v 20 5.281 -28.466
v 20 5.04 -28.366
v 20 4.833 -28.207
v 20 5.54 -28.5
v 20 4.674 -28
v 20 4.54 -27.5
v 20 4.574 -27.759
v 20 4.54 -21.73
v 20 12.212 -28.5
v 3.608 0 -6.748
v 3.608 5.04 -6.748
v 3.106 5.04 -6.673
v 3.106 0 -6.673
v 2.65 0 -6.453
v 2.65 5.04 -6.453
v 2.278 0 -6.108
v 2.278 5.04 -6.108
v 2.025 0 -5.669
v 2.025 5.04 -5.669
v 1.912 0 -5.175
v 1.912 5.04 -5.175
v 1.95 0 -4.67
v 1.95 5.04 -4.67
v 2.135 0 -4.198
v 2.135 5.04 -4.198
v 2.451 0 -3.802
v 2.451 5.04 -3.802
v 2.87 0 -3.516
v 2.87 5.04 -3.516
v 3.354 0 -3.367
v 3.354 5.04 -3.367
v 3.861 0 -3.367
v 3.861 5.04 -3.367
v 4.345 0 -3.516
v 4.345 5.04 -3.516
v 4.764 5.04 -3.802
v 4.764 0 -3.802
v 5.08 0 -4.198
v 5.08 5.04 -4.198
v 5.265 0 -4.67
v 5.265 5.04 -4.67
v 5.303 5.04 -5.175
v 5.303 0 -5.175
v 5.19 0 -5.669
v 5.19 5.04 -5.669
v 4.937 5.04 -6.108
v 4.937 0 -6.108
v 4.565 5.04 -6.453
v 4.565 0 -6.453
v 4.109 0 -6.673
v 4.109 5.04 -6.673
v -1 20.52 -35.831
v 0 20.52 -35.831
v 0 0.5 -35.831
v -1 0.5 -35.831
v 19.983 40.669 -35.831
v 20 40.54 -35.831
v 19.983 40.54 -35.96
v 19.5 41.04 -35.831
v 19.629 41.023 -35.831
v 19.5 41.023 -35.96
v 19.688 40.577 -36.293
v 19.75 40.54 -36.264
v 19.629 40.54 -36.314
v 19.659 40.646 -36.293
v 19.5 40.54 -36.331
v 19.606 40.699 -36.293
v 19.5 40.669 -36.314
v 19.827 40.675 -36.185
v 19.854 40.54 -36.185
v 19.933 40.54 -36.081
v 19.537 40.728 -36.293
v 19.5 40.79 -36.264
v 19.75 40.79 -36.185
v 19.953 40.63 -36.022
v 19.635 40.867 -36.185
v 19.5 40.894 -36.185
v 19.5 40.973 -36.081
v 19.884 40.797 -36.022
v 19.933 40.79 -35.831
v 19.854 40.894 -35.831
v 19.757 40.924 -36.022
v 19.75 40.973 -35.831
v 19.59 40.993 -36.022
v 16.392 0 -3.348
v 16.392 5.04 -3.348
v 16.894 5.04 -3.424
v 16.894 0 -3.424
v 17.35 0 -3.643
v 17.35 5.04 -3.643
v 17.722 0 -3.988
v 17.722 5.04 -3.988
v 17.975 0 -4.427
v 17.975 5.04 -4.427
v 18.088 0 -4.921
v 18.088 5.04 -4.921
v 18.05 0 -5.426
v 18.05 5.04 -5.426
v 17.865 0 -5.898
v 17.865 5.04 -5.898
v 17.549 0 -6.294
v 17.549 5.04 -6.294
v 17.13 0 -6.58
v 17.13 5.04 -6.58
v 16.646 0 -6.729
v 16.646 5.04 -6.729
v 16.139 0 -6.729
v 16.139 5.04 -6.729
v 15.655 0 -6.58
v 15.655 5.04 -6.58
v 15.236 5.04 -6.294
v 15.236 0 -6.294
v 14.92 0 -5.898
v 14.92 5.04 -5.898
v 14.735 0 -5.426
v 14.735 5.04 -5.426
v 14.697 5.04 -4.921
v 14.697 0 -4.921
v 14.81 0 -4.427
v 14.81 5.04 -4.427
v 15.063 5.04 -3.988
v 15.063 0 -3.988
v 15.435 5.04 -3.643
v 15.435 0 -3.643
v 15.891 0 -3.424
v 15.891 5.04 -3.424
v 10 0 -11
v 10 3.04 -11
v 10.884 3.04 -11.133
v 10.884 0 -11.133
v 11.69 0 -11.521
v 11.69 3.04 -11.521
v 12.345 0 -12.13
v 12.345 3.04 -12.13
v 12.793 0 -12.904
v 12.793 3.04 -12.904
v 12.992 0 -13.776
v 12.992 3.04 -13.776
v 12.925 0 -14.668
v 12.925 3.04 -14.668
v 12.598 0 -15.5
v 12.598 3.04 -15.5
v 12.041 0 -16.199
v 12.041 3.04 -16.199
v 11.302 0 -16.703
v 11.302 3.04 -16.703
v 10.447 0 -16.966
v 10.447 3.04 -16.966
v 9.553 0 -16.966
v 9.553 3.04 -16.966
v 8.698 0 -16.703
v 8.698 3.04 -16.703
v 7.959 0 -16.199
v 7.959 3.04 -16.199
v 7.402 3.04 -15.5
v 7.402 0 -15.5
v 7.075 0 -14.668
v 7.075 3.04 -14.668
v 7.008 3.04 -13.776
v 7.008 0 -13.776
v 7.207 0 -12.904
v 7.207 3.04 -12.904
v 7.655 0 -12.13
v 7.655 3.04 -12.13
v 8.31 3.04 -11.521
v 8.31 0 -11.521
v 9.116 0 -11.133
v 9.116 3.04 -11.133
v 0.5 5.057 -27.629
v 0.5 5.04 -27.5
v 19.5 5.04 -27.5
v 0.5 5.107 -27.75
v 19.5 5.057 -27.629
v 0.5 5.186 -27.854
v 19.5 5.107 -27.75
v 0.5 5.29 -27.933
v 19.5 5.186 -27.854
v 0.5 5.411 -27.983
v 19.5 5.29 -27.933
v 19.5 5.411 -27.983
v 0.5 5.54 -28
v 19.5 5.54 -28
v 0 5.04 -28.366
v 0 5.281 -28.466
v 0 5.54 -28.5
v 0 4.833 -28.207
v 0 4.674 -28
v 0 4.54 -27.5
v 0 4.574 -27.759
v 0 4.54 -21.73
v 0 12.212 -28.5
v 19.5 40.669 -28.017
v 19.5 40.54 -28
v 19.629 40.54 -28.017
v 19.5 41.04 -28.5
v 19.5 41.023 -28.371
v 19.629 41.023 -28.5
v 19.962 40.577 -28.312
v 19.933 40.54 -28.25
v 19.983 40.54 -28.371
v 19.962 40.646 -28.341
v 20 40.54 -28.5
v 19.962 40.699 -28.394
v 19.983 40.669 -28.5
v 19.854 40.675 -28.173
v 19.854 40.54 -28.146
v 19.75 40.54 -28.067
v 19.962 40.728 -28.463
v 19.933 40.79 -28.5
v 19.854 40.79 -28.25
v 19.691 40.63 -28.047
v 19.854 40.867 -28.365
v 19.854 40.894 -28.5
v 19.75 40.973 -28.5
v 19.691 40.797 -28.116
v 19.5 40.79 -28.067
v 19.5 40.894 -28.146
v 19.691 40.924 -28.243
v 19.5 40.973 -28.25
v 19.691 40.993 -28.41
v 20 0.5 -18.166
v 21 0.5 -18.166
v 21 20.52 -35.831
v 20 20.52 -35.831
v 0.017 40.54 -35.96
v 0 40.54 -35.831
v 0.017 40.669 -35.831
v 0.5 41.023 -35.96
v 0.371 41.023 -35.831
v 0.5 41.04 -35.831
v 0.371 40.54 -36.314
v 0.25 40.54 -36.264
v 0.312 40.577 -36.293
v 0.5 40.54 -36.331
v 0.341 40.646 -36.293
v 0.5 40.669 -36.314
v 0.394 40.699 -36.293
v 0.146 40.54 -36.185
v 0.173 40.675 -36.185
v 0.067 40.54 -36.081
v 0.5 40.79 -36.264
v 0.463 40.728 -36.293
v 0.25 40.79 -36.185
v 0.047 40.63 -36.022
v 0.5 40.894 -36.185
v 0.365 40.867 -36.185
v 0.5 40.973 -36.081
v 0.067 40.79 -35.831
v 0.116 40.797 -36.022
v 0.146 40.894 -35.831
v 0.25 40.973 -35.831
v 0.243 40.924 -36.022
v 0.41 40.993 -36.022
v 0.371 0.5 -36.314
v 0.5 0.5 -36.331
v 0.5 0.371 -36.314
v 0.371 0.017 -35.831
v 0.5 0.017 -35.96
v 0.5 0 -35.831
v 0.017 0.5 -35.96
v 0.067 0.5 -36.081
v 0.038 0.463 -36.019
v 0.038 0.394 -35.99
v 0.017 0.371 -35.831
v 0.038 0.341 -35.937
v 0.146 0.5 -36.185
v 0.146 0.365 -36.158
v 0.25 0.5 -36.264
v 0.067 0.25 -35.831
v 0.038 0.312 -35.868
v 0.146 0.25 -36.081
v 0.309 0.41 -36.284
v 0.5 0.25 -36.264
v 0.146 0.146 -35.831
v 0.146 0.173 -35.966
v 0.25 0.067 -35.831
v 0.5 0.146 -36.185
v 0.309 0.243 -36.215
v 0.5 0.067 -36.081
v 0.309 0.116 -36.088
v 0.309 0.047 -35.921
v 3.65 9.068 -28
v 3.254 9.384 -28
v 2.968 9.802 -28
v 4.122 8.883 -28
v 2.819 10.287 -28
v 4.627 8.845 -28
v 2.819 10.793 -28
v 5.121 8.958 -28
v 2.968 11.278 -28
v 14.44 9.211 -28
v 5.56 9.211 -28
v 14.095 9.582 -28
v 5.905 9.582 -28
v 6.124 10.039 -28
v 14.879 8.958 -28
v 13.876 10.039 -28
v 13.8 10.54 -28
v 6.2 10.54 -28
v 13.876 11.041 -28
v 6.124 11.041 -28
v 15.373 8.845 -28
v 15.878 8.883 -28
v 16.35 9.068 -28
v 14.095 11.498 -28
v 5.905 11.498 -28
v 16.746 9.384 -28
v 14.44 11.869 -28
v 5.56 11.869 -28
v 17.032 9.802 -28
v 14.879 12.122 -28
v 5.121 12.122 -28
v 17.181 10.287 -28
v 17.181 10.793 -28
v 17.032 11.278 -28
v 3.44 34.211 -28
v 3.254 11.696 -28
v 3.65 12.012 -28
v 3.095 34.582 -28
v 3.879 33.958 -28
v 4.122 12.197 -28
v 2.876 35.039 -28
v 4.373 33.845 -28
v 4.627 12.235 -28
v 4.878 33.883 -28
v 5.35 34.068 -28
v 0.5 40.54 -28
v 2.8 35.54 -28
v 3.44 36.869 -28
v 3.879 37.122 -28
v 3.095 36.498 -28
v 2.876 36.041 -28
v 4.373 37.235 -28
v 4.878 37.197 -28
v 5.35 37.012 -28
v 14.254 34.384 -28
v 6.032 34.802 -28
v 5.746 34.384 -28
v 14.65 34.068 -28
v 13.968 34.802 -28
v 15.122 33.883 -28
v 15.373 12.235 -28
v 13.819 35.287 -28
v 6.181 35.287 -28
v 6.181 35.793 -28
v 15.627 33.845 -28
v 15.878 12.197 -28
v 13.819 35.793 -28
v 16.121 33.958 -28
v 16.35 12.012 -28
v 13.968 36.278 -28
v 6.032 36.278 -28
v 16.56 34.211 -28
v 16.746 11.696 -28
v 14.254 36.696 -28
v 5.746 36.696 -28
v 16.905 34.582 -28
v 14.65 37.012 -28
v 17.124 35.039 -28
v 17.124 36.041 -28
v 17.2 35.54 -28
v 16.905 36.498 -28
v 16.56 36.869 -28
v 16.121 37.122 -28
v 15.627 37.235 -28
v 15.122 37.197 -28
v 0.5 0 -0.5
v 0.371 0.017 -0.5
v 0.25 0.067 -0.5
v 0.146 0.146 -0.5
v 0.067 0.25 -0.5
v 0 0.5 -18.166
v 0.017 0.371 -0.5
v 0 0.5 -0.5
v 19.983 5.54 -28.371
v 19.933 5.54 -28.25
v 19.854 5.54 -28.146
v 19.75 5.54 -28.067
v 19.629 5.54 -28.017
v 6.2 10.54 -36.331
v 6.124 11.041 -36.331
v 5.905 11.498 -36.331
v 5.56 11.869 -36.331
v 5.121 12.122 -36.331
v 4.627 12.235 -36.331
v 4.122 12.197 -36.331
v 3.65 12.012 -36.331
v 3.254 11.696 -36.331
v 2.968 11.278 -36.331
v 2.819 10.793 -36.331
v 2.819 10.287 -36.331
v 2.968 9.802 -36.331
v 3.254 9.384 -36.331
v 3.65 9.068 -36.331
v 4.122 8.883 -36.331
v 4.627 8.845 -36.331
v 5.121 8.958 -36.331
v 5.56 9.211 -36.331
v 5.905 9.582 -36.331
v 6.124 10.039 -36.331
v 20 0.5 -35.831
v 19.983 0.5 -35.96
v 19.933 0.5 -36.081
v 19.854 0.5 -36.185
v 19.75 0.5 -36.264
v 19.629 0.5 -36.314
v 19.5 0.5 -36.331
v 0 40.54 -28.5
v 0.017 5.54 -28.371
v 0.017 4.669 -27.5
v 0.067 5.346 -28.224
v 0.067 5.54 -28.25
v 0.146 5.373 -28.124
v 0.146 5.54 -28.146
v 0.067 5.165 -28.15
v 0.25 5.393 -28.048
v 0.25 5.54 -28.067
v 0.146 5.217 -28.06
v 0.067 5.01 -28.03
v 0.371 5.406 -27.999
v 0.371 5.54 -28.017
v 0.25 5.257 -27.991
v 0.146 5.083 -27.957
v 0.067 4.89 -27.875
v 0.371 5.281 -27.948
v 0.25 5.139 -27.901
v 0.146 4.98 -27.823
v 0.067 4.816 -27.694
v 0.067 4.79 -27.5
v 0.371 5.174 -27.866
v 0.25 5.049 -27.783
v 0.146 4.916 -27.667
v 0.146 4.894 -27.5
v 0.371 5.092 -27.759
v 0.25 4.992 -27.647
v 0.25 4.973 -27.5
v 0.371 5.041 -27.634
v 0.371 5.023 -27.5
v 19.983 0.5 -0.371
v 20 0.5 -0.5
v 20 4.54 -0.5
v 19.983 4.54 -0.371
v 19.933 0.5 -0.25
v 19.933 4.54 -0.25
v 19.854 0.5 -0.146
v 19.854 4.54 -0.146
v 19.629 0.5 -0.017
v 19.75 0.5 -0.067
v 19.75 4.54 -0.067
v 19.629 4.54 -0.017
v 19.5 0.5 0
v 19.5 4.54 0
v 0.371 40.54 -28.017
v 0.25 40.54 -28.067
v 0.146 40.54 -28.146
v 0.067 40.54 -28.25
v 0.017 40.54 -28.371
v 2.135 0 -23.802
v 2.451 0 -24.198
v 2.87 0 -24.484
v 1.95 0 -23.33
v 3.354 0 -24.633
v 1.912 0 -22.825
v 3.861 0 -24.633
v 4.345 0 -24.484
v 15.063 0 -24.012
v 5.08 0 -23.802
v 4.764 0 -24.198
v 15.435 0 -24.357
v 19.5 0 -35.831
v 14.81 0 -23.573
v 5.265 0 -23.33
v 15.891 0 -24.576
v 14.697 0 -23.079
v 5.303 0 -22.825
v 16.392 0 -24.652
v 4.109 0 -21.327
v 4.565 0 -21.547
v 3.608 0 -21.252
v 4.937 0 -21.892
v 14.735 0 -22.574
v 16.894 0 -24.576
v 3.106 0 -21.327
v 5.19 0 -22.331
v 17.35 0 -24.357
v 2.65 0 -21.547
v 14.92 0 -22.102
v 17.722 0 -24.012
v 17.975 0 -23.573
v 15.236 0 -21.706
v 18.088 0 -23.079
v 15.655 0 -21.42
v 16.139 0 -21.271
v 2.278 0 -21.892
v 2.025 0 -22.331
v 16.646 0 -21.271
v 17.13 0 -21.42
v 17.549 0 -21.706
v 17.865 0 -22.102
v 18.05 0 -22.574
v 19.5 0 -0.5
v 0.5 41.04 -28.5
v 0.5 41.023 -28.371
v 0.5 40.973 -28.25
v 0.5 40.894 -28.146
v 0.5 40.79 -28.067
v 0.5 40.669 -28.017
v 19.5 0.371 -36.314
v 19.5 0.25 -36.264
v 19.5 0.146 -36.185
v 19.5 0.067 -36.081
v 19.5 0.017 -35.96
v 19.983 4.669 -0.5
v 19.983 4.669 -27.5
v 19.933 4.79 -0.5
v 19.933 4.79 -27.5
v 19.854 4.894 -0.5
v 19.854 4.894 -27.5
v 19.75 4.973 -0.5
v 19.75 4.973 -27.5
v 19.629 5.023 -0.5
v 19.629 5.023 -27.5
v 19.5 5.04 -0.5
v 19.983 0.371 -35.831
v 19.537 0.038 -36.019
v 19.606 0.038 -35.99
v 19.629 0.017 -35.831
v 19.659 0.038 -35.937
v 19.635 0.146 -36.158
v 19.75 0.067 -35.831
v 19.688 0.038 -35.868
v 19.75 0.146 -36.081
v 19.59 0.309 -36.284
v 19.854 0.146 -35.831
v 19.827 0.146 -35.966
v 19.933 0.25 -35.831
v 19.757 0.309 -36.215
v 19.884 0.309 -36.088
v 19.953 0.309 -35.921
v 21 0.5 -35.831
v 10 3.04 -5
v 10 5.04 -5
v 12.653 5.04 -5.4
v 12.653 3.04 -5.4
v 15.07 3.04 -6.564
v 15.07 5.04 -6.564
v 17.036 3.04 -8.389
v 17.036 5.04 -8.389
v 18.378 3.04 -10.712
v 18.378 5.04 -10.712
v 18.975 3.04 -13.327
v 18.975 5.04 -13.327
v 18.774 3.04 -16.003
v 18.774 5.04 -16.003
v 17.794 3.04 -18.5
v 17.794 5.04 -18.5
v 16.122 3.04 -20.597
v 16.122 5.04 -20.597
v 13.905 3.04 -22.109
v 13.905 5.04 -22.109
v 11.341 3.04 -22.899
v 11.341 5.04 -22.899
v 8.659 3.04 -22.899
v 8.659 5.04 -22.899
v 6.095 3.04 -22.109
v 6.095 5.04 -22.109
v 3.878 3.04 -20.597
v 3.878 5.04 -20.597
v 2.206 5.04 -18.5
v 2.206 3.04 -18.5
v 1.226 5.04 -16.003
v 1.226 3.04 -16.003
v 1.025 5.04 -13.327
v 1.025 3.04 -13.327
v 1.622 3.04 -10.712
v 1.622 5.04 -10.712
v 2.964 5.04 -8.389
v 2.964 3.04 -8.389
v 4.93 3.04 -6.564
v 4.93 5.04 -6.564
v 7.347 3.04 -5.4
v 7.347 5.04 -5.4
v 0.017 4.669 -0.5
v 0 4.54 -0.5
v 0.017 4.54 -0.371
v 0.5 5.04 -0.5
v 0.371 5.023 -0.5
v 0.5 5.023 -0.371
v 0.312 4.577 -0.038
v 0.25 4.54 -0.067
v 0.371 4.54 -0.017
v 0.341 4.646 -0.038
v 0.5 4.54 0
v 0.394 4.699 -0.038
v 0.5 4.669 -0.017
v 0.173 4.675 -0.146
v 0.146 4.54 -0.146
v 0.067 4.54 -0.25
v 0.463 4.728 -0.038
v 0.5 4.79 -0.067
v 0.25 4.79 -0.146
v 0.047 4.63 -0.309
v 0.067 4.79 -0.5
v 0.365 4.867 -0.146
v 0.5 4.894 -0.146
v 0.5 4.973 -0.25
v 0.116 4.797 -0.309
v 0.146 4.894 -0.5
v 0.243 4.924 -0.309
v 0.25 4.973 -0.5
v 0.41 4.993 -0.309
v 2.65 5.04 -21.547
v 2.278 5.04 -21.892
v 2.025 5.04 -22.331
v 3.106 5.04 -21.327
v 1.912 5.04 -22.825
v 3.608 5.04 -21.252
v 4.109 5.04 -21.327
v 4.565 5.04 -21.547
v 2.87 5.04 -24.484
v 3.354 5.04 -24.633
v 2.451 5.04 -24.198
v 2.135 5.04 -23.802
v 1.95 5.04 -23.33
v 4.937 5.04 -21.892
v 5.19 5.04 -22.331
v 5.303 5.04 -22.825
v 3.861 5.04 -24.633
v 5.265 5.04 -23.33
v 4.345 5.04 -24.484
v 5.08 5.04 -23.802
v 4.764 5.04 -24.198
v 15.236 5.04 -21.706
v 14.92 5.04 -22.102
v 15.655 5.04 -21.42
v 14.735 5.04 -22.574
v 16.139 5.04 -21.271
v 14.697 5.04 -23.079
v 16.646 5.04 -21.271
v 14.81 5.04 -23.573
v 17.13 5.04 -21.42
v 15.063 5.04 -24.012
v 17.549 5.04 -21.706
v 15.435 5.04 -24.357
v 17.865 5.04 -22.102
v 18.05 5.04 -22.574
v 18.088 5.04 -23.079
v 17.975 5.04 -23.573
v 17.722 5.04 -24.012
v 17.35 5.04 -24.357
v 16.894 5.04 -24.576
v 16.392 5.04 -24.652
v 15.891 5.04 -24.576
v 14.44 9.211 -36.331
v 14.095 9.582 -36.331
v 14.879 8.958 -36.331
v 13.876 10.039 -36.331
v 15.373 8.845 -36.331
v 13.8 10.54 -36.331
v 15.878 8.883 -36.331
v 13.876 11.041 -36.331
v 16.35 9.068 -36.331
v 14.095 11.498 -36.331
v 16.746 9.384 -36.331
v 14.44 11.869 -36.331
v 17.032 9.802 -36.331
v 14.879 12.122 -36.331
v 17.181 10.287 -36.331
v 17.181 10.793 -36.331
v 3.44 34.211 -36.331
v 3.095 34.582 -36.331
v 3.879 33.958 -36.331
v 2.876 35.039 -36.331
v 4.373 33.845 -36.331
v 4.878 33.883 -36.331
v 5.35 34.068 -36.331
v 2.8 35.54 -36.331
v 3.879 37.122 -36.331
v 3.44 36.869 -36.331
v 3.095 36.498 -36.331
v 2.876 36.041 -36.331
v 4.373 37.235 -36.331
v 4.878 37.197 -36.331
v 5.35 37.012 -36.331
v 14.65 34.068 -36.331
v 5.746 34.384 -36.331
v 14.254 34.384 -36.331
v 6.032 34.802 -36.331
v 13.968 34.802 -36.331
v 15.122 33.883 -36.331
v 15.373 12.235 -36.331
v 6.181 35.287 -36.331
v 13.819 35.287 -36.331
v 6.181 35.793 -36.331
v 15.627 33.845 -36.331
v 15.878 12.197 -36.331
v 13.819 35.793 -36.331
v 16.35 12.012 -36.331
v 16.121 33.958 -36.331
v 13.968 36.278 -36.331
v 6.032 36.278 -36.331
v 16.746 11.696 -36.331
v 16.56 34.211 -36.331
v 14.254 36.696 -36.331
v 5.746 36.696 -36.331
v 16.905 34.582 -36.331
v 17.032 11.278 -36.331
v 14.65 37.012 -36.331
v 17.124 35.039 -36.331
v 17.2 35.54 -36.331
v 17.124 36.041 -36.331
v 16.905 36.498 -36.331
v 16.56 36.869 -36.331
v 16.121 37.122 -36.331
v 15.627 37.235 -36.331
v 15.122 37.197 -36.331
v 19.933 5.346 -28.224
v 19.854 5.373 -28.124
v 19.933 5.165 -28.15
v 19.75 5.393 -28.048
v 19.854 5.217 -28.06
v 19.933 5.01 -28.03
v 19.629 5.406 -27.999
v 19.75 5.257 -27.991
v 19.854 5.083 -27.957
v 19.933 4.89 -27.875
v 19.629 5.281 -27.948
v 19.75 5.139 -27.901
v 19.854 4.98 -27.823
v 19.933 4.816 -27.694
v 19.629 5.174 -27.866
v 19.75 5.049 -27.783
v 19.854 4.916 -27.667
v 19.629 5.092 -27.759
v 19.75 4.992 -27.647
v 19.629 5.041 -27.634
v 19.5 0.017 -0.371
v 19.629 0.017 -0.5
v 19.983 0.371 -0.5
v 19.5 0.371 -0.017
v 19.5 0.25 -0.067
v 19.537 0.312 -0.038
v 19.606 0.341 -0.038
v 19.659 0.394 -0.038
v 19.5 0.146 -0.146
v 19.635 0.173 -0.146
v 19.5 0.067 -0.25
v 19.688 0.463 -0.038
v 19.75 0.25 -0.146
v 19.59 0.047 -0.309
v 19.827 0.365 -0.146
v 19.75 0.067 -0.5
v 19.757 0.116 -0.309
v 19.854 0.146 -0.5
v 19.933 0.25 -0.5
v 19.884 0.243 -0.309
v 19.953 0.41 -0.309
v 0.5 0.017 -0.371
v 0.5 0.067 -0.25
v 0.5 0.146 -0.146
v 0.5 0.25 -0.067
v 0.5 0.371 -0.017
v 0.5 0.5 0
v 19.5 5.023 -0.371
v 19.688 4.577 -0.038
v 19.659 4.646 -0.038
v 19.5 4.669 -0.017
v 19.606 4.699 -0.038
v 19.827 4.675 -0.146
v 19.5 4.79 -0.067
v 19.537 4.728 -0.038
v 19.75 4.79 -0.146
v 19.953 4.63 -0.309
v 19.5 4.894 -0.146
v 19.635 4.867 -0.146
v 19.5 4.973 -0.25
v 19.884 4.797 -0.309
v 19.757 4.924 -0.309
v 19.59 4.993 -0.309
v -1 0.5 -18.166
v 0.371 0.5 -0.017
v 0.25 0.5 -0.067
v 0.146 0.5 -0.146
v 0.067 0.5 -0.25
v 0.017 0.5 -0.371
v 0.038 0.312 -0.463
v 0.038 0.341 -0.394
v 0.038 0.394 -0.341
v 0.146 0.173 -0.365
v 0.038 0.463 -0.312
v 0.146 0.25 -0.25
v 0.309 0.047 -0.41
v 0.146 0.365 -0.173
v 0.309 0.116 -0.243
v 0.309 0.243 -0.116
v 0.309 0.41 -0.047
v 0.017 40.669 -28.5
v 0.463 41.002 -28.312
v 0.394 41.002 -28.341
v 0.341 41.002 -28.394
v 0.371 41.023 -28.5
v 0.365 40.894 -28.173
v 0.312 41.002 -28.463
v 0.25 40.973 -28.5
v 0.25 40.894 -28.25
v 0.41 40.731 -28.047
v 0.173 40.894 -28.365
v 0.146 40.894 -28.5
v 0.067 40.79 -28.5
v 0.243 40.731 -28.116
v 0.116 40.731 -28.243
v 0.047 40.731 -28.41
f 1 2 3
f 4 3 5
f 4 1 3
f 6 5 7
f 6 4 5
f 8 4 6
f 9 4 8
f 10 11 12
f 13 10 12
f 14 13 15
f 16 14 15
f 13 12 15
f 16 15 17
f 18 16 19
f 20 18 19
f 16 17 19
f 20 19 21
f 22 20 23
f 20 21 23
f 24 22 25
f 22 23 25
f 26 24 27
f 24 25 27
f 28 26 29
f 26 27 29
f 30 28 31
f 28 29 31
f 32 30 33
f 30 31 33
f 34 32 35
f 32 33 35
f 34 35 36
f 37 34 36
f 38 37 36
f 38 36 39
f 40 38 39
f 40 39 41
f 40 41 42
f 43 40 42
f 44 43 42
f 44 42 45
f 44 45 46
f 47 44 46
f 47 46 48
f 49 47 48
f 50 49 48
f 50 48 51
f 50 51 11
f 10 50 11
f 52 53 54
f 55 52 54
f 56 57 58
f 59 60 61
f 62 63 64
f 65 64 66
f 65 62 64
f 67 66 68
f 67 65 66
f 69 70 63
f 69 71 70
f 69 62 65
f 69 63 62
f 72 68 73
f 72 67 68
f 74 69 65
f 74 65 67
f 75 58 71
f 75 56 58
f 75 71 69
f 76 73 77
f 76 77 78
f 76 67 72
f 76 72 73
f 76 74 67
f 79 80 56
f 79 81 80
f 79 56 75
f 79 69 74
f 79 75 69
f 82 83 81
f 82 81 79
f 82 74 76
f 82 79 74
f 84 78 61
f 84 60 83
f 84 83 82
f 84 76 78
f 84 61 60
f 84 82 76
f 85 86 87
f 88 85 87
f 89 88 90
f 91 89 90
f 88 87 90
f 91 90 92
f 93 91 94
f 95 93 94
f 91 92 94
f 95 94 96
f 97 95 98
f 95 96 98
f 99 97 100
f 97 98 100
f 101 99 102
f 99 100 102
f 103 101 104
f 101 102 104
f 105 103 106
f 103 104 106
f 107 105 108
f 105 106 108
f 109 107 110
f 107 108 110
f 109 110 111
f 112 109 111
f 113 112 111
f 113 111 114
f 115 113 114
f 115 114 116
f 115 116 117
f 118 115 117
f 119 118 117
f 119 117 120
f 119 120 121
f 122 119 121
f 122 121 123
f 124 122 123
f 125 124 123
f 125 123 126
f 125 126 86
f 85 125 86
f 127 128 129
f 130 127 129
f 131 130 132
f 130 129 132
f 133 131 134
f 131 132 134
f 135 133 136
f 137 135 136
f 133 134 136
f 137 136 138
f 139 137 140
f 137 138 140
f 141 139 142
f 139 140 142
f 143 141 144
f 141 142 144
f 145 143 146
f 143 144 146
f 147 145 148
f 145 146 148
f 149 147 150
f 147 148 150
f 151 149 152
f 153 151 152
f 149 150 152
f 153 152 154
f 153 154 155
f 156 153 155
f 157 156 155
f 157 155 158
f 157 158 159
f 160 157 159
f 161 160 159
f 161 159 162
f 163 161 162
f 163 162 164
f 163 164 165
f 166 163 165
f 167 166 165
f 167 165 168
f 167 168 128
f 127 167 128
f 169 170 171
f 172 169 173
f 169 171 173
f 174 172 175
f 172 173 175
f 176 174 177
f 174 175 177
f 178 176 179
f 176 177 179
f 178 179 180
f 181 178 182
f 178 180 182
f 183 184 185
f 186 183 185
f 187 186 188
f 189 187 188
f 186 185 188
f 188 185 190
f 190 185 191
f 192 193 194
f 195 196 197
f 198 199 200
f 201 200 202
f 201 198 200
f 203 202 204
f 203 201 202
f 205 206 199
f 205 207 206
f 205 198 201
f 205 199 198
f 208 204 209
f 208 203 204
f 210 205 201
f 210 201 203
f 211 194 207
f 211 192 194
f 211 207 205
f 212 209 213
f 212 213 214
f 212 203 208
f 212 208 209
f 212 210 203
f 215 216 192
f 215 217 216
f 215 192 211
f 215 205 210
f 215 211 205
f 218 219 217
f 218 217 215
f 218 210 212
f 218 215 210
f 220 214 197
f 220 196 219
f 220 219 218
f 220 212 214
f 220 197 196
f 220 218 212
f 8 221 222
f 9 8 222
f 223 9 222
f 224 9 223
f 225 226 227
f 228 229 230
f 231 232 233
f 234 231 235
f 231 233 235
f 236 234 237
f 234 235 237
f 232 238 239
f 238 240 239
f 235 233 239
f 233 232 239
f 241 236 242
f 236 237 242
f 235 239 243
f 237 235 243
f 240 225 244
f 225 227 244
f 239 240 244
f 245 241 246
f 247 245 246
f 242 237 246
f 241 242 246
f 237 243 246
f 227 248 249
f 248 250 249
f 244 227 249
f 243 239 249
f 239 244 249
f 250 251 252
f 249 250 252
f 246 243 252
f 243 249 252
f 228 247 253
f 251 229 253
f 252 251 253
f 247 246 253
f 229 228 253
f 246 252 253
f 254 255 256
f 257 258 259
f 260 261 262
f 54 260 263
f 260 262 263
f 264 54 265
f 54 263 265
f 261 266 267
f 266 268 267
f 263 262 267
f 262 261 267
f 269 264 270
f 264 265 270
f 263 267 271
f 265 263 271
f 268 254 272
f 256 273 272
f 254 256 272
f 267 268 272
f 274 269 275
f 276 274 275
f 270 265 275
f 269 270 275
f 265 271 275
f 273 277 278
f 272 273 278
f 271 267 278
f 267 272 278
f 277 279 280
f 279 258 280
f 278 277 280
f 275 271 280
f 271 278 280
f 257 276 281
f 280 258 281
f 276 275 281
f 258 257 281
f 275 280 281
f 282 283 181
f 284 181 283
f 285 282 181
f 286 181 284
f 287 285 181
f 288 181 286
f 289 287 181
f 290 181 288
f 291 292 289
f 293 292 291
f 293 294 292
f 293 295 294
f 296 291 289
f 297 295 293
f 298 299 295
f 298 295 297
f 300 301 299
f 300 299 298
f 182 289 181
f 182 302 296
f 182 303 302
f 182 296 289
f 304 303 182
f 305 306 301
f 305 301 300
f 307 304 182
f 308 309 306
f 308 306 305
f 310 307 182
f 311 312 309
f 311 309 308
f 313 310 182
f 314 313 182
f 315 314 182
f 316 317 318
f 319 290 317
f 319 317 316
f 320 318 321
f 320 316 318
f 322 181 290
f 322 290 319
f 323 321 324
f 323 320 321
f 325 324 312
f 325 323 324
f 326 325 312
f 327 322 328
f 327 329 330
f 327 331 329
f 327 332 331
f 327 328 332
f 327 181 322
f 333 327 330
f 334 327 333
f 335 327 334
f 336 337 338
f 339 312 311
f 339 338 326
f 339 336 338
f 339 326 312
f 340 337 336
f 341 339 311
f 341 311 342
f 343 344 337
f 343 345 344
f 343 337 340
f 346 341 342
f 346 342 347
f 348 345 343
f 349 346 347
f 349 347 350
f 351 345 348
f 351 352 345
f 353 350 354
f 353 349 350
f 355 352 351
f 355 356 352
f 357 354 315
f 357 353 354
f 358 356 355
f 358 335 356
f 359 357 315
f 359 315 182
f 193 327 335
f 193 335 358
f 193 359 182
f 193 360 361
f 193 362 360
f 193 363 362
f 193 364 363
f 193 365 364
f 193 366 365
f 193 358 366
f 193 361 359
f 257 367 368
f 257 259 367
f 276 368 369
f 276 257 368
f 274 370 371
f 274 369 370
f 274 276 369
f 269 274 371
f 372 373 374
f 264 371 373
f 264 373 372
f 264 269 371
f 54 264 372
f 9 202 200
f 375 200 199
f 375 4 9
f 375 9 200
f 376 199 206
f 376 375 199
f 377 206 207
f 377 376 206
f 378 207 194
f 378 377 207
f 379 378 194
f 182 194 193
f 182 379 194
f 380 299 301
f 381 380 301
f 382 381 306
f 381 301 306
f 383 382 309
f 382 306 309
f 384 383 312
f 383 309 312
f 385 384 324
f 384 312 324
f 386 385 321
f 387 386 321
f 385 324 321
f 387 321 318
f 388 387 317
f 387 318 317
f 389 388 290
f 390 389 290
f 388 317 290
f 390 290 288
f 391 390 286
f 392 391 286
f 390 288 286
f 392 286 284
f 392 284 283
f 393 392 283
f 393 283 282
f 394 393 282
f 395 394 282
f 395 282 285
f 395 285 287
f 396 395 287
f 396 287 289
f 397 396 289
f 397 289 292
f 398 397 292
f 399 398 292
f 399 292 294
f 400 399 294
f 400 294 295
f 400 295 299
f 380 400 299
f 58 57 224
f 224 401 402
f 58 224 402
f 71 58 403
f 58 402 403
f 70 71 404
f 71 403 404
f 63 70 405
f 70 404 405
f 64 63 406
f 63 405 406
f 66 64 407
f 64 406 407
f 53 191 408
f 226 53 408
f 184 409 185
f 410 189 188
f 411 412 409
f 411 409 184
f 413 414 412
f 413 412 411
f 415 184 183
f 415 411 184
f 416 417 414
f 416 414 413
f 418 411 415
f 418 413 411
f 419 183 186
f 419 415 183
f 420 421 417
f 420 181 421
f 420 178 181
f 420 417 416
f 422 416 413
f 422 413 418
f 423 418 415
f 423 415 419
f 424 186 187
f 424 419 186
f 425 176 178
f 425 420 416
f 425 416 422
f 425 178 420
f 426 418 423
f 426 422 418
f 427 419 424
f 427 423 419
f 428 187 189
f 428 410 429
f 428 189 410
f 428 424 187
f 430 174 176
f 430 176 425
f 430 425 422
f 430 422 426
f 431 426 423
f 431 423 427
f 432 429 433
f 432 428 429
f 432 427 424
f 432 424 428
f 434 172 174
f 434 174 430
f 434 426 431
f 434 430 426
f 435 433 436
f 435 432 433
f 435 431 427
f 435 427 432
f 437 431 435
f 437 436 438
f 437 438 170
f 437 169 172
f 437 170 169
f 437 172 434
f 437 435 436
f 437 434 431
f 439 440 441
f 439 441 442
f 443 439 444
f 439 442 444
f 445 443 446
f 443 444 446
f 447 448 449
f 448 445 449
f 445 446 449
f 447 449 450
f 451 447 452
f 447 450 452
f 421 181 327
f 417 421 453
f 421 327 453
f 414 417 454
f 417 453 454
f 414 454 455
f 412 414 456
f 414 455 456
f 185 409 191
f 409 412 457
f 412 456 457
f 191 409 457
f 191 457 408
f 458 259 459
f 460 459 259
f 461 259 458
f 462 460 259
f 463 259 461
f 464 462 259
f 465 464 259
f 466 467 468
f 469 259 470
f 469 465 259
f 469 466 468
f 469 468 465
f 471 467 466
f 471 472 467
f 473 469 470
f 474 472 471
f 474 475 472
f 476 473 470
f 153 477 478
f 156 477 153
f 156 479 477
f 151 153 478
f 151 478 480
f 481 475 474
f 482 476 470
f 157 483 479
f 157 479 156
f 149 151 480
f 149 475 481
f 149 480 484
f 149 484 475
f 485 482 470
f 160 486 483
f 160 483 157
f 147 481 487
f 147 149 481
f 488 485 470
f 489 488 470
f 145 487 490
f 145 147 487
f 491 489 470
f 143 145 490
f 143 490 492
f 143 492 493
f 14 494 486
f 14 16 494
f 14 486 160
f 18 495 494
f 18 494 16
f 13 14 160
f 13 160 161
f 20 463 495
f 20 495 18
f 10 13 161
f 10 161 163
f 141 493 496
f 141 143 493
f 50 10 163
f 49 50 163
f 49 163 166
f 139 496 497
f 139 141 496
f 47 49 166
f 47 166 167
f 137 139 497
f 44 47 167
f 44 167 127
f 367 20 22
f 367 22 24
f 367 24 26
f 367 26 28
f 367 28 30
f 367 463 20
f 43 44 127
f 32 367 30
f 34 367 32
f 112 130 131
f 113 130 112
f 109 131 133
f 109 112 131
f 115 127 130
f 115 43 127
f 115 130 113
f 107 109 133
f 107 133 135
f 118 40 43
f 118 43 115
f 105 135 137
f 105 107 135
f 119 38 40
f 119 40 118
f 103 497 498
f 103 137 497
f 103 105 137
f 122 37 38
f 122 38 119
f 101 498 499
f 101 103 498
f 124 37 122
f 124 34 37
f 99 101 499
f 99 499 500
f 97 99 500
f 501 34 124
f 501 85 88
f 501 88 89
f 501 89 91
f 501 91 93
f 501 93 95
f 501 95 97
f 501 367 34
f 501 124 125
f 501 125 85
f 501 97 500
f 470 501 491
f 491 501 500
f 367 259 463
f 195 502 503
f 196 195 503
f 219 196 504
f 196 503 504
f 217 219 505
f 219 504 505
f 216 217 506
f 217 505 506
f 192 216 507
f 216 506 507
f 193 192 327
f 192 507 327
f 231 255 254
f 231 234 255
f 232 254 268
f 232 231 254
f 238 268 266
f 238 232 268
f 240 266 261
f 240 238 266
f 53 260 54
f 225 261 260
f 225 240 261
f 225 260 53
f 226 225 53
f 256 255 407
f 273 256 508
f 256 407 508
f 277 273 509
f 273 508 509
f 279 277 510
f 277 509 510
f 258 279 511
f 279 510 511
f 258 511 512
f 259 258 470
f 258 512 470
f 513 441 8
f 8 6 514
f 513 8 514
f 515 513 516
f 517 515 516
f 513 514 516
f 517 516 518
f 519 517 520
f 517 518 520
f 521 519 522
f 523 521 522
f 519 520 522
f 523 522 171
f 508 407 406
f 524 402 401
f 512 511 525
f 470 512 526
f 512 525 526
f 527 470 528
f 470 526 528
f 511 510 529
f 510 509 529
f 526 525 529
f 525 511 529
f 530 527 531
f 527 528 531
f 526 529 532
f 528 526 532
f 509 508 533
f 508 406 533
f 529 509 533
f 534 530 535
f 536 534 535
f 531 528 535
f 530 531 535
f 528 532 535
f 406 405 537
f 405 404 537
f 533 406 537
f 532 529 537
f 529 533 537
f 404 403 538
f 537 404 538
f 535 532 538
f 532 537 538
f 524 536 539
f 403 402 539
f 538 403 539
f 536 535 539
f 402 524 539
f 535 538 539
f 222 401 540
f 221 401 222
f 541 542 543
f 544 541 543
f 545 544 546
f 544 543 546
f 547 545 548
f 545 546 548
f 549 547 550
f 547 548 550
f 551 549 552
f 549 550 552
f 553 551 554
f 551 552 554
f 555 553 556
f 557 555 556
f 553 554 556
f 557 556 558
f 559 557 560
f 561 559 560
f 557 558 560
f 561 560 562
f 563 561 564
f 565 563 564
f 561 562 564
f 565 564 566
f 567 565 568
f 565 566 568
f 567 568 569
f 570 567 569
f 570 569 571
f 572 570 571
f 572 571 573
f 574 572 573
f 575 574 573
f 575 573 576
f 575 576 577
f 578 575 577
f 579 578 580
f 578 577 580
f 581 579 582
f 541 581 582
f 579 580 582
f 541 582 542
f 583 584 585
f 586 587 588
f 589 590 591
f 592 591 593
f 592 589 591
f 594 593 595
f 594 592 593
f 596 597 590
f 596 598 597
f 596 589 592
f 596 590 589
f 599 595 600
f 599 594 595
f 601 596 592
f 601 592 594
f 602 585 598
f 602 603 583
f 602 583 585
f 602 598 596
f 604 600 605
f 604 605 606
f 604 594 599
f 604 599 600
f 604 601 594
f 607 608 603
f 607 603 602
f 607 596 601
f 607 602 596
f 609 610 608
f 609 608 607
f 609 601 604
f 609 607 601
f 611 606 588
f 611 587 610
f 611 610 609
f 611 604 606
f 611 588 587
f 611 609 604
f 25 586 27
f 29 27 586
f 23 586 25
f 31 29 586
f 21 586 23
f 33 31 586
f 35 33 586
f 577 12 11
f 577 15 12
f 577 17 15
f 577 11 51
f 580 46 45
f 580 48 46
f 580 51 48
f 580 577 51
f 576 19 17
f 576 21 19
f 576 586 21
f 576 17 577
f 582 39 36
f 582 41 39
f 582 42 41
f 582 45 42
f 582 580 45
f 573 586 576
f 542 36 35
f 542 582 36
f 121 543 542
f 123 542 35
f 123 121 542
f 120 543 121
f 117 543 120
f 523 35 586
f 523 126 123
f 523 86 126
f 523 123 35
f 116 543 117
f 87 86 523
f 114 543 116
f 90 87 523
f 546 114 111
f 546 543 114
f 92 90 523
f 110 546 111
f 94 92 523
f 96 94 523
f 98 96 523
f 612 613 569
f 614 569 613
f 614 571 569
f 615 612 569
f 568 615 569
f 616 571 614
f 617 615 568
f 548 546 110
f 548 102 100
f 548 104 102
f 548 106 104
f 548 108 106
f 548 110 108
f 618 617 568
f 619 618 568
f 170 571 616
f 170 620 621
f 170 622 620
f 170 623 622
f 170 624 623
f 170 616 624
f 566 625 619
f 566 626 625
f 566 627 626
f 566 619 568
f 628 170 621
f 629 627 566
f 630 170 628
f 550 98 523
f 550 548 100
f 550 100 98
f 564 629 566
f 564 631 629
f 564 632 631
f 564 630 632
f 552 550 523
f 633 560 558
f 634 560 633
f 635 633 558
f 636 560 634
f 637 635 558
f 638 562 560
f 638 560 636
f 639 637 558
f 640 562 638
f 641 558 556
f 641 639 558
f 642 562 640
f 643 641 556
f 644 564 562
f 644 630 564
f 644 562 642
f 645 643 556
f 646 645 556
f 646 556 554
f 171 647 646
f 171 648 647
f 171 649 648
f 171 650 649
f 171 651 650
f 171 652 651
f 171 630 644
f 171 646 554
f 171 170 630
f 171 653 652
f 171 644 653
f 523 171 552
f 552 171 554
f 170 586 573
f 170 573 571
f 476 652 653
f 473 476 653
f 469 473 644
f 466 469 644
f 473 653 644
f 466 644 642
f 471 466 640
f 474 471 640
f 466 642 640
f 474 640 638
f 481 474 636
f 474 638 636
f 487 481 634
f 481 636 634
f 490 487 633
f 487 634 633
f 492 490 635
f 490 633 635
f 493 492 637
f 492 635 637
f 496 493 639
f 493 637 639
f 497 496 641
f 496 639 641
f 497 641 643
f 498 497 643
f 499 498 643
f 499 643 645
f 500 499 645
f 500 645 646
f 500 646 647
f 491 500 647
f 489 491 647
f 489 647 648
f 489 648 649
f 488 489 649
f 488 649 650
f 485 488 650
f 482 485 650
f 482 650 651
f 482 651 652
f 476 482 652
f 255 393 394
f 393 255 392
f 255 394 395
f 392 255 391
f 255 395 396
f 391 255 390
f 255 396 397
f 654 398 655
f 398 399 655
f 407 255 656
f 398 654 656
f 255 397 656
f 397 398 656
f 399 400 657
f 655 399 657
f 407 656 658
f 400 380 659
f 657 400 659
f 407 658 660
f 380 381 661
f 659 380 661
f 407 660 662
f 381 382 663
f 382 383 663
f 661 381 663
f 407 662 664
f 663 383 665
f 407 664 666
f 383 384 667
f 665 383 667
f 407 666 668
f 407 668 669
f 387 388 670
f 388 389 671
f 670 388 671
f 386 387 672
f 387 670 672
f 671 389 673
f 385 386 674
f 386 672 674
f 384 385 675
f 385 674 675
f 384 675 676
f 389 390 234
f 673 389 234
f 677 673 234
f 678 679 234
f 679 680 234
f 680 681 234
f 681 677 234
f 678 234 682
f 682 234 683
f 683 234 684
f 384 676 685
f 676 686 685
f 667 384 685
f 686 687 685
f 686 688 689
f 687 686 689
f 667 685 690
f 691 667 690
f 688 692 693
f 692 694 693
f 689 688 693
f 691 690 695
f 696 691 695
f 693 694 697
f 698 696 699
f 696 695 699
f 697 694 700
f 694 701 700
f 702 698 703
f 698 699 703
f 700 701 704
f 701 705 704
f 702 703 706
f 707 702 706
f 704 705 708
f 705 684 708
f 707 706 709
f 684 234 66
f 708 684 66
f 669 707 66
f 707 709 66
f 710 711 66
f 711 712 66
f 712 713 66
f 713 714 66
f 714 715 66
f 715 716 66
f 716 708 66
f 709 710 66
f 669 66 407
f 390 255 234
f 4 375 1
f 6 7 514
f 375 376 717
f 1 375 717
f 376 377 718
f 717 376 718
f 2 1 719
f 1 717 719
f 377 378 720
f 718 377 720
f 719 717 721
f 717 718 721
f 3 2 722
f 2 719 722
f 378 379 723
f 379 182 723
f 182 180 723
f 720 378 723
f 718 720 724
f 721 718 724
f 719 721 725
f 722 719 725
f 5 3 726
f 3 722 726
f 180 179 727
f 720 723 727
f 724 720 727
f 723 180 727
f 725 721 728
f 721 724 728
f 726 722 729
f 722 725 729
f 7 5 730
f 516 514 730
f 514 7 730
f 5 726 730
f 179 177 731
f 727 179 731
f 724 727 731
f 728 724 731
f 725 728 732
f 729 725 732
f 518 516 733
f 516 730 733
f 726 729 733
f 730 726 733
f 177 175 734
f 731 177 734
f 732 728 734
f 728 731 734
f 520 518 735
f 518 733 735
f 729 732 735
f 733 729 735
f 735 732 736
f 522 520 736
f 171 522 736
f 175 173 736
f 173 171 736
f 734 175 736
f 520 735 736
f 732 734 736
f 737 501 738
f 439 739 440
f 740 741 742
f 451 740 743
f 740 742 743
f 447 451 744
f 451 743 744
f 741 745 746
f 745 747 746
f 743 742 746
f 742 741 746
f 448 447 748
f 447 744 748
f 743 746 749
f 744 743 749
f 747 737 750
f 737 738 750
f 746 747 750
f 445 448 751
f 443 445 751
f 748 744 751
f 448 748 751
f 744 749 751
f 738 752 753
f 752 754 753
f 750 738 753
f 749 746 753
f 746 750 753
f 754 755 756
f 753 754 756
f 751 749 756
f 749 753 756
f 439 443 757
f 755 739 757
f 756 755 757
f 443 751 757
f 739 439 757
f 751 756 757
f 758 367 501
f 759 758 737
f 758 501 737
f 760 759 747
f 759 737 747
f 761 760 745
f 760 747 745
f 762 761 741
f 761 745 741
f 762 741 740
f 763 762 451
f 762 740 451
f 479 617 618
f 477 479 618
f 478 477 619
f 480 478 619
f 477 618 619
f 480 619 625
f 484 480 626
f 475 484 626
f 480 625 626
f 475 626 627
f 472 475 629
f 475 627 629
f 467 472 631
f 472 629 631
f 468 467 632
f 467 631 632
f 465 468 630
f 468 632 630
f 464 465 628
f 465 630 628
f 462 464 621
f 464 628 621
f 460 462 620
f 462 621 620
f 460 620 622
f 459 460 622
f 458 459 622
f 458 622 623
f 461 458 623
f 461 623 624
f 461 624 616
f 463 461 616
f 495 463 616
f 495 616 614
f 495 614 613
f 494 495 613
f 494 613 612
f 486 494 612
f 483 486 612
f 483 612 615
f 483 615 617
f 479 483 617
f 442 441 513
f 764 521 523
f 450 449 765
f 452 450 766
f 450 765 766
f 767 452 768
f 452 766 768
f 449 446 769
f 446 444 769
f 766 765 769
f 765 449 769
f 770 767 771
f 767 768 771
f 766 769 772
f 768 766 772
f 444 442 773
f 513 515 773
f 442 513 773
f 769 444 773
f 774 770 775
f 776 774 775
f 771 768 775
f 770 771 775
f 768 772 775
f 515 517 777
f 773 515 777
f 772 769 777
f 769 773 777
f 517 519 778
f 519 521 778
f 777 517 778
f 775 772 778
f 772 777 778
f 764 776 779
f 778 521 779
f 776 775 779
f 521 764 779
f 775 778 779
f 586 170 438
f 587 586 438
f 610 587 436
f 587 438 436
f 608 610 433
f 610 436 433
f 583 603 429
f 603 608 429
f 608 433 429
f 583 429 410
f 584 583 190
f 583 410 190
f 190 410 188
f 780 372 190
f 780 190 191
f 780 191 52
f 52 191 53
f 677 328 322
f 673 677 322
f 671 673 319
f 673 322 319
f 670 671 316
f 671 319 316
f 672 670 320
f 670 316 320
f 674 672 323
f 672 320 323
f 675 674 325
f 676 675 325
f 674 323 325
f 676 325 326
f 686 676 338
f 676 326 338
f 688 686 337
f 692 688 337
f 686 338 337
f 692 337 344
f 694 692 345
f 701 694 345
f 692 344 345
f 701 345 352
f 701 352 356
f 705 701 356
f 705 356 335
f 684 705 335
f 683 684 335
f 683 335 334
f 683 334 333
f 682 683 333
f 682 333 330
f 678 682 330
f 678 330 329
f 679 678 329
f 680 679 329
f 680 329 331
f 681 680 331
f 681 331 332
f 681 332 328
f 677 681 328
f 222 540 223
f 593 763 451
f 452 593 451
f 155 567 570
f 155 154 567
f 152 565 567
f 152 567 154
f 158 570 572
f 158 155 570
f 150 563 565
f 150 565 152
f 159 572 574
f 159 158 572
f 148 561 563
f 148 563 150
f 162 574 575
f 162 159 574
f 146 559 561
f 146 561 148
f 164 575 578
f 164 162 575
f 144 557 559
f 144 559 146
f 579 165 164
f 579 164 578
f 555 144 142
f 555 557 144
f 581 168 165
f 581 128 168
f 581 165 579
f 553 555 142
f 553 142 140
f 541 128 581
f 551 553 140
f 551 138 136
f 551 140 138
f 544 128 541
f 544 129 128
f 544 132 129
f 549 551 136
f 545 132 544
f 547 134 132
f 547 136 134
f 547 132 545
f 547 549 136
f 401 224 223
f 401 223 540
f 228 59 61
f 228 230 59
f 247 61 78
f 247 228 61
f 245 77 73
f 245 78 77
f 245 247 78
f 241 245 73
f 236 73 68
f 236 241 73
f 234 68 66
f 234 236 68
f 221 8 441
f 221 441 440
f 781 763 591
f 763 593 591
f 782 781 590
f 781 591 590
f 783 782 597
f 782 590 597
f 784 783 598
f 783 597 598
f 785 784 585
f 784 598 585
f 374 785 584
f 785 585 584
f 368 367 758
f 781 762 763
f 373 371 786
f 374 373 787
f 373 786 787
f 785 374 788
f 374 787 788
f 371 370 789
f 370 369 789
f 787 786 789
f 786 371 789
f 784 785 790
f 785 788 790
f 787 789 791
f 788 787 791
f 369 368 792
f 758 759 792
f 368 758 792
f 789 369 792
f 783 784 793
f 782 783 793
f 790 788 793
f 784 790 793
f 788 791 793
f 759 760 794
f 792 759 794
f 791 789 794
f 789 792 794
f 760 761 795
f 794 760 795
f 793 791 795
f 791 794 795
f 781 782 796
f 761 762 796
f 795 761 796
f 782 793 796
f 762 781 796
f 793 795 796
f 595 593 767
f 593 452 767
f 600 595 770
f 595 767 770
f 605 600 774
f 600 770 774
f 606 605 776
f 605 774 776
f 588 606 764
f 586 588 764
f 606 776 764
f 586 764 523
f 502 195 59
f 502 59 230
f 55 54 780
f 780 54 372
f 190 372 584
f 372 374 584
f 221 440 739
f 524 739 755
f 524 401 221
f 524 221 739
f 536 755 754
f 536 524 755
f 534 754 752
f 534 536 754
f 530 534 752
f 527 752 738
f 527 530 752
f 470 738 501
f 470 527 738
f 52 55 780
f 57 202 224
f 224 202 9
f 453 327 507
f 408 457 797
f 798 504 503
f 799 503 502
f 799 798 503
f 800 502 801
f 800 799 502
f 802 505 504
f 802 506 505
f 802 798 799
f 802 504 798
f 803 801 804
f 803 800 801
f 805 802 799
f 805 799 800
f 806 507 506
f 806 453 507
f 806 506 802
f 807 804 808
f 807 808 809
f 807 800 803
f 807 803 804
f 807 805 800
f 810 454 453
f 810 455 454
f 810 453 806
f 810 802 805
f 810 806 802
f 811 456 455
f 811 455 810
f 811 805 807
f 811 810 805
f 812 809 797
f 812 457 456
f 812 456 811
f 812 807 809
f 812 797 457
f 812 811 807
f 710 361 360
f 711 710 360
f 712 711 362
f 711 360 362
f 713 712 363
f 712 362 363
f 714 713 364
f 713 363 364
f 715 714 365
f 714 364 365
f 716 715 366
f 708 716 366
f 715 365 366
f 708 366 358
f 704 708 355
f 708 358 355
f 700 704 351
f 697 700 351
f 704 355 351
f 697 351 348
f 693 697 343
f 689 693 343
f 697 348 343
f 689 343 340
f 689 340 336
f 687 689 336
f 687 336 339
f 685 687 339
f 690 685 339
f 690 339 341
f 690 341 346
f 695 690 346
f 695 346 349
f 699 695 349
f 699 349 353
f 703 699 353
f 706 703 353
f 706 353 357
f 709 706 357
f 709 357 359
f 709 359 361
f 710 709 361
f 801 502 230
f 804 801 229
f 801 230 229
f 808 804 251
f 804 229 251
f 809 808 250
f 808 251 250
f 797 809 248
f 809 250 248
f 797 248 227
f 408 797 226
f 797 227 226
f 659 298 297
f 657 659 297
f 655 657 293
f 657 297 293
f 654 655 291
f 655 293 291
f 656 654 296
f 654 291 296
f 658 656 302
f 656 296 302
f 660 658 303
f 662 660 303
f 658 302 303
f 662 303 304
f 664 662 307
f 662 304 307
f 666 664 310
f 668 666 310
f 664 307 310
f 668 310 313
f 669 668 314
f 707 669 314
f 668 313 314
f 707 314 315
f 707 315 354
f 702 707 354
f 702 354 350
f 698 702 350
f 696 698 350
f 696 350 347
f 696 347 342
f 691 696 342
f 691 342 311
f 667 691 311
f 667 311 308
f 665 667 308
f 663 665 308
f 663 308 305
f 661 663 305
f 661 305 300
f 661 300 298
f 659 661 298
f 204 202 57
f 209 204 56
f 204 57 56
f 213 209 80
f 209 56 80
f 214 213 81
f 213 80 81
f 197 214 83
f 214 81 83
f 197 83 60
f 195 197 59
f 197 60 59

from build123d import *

# Parameters (mm, degrees)
SKETCH1_W           = 20
SKETCH1_H           = 28
BOSS_EXTRUDE1_DEPTH = 5.04
SKETCH3_R           = 9
CUT_EXTRUDE1_DEPTH  = 2
SKETCH4_R           = 3
CUT_EXTRUDE2_DEPTH  = 35.543329313
SKETCH7_R           = 1.7
CUT_EXTRUDE3_DEPTH  = 35.776451803
BOSS_EXTRUDE2_DEPTH = 8.331
SKETCH9_R           = 1.7
CUT_EXTRUDE4_DEPTH  = 54.556340428
FILLET2_R           = 0.5
BOSS_EXTRUDE3_DEPTH = 1
BOSS_EXTRUDE4_DEPTH = 1


with BuildPart() as part:
    # Sketch1 → Boss-Extrude1 (new body)
    with BuildSketch(Plane(origin=(0, 0, 0), x_dir=(1, 0, 0), z_dir=(0, 1, 0))):
        with Locations((10, 14)):
            Rectangle(SKETCH1_W, SKETCH1_H)
    extrude(amount=BOSS_EXTRUDE1_DEPTH)

    # Sketch3 → Cut-Extrude1 (cut)
    with BuildSketch(Plane(origin=(0, 5.04, 0), x_dir=(1, 0, 0), z_dir=(0, 1, 0))):
        with Locations((10, 14)):
            Circle(SKETCH3_R)
    extrude(amount=-CUT_EXTRUDE1_DEPTH, mode=Mode.SUBTRACT)

    # Sketch4 → Cut-Extrude2 (cut, through all)
    with BuildSketch(Plane(origin=(0, 3.04, 0), x_dir=(1, 0, 0), z_dir=(0, 1, 0))):
        with Locations((10, 14)):
            Circle(SKETCH4_R)
    extrude(amount=-CUT_EXTRUDE2_DEPTH, mode=Mode.SUBTRACT)

    # Sketch7 → Cut-Extrude3 (cut, through all)
    with BuildSketch(Plane(origin=(0, 5.04, 0), x_dir=(1, 0, 0), z_dir=(0, 1, 0))):
        with Locations((3.607579394, 22.951924866)):
            Circle(SKETCH7_R)
        with Locations((16.392420606, 22.951924866)):
            Circle(SKETCH7_R)
        with Locations((16.392420606, 5.048075134)):
            Circle(SKETCH7_R)
        with Locations((3.607579394, 5.048075134)):
            Circle(SKETCH7_R)
    extrude(amount=-CUT_EXTRUDE3_DEPTH, mode=Mode.SUBTRACT)

    # Sketch8 → Boss-Extrude2 (add)
    with BuildSketch(Plane(origin=(0, 0, -28), x_dir=(-1, 0, 0), z_dir=(0, 0, -1))):
        Polygon((-20, 5.04), (-20, 41.04), (0, 41.04), (0, 5.04), (0, 0), (-20, 0), align=None)
    extrude(amount=BOSS_EXTRUDE2_DEPTH)

    # Sketch9 → Cut-Extrude4 (cut, through all)
    with BuildSketch(Plane.XY.offset(-28)):
        with Locations((4.5, 10.54)):
            Circle(SKETCH9_R)
        with Locations((15.5, 10.54)):
            Circle(SKETCH9_R)
        with Locations((15.5, 35.54)):
            Circle(SKETCH9_R)
        with Locations((4.5, 35.54)):
            Circle(SKETCH9_R)
    extrude(amount=-CUT_EXTRUDE4_DEPTH, mode=Mode.SUBTRACT)

    # Fillet2
    fillet2_edges = [part.edges().sort_by_distance(p)[0] for p in [
        (10, 5.04, -28),
        (0, 41.04, -32.1655),
        (10, 41.04, -36.331),
        (20, 41.04, -32.1655),
        (10, 41.04, -28),
        (20, 23.04, -28),
        (20, 20.52, -36.331),
        (0, 23.04, -28),
        (10, 0, -36.331),
        (0, 20.52, -36.331),
        (0, 0, -18.1655),
        (20, 0, -18.1655),
        (10, 0, 0),
        (20, 2.52, 0),
        (0, 2.52, 0),
        (0, 5.04, -14),
        (10, 5.04, 0),
        (20, 5.04, -14),
    ]]
    fillet(fillet2_edges, radius=FILLET2_R)

    # Sketch10 → Boss-Extrude3 (add)
    with BuildSketch(Plane(origin=(20, 0, 0), x_dir=(0, 0, -1), z_dir=(1, 0, 0))):
        Polygon((18.1655, 0.5), (35.831, 20.52), (35.831, 0.5), align=None)
    extrude(amount=BOSS_EXTRUDE3_DEPTH)

    # Sketch11 → Boss-Extrude4 (add)
    with BuildSketch(Plane.ZY):
        Polygon((-18.1655, 0.5), (-35.831, 20.52), (-35.831, 0.5), align=None)
    extrude(amount=BOSS_EXTRUDE4_DEPTH)


solid = part.part
